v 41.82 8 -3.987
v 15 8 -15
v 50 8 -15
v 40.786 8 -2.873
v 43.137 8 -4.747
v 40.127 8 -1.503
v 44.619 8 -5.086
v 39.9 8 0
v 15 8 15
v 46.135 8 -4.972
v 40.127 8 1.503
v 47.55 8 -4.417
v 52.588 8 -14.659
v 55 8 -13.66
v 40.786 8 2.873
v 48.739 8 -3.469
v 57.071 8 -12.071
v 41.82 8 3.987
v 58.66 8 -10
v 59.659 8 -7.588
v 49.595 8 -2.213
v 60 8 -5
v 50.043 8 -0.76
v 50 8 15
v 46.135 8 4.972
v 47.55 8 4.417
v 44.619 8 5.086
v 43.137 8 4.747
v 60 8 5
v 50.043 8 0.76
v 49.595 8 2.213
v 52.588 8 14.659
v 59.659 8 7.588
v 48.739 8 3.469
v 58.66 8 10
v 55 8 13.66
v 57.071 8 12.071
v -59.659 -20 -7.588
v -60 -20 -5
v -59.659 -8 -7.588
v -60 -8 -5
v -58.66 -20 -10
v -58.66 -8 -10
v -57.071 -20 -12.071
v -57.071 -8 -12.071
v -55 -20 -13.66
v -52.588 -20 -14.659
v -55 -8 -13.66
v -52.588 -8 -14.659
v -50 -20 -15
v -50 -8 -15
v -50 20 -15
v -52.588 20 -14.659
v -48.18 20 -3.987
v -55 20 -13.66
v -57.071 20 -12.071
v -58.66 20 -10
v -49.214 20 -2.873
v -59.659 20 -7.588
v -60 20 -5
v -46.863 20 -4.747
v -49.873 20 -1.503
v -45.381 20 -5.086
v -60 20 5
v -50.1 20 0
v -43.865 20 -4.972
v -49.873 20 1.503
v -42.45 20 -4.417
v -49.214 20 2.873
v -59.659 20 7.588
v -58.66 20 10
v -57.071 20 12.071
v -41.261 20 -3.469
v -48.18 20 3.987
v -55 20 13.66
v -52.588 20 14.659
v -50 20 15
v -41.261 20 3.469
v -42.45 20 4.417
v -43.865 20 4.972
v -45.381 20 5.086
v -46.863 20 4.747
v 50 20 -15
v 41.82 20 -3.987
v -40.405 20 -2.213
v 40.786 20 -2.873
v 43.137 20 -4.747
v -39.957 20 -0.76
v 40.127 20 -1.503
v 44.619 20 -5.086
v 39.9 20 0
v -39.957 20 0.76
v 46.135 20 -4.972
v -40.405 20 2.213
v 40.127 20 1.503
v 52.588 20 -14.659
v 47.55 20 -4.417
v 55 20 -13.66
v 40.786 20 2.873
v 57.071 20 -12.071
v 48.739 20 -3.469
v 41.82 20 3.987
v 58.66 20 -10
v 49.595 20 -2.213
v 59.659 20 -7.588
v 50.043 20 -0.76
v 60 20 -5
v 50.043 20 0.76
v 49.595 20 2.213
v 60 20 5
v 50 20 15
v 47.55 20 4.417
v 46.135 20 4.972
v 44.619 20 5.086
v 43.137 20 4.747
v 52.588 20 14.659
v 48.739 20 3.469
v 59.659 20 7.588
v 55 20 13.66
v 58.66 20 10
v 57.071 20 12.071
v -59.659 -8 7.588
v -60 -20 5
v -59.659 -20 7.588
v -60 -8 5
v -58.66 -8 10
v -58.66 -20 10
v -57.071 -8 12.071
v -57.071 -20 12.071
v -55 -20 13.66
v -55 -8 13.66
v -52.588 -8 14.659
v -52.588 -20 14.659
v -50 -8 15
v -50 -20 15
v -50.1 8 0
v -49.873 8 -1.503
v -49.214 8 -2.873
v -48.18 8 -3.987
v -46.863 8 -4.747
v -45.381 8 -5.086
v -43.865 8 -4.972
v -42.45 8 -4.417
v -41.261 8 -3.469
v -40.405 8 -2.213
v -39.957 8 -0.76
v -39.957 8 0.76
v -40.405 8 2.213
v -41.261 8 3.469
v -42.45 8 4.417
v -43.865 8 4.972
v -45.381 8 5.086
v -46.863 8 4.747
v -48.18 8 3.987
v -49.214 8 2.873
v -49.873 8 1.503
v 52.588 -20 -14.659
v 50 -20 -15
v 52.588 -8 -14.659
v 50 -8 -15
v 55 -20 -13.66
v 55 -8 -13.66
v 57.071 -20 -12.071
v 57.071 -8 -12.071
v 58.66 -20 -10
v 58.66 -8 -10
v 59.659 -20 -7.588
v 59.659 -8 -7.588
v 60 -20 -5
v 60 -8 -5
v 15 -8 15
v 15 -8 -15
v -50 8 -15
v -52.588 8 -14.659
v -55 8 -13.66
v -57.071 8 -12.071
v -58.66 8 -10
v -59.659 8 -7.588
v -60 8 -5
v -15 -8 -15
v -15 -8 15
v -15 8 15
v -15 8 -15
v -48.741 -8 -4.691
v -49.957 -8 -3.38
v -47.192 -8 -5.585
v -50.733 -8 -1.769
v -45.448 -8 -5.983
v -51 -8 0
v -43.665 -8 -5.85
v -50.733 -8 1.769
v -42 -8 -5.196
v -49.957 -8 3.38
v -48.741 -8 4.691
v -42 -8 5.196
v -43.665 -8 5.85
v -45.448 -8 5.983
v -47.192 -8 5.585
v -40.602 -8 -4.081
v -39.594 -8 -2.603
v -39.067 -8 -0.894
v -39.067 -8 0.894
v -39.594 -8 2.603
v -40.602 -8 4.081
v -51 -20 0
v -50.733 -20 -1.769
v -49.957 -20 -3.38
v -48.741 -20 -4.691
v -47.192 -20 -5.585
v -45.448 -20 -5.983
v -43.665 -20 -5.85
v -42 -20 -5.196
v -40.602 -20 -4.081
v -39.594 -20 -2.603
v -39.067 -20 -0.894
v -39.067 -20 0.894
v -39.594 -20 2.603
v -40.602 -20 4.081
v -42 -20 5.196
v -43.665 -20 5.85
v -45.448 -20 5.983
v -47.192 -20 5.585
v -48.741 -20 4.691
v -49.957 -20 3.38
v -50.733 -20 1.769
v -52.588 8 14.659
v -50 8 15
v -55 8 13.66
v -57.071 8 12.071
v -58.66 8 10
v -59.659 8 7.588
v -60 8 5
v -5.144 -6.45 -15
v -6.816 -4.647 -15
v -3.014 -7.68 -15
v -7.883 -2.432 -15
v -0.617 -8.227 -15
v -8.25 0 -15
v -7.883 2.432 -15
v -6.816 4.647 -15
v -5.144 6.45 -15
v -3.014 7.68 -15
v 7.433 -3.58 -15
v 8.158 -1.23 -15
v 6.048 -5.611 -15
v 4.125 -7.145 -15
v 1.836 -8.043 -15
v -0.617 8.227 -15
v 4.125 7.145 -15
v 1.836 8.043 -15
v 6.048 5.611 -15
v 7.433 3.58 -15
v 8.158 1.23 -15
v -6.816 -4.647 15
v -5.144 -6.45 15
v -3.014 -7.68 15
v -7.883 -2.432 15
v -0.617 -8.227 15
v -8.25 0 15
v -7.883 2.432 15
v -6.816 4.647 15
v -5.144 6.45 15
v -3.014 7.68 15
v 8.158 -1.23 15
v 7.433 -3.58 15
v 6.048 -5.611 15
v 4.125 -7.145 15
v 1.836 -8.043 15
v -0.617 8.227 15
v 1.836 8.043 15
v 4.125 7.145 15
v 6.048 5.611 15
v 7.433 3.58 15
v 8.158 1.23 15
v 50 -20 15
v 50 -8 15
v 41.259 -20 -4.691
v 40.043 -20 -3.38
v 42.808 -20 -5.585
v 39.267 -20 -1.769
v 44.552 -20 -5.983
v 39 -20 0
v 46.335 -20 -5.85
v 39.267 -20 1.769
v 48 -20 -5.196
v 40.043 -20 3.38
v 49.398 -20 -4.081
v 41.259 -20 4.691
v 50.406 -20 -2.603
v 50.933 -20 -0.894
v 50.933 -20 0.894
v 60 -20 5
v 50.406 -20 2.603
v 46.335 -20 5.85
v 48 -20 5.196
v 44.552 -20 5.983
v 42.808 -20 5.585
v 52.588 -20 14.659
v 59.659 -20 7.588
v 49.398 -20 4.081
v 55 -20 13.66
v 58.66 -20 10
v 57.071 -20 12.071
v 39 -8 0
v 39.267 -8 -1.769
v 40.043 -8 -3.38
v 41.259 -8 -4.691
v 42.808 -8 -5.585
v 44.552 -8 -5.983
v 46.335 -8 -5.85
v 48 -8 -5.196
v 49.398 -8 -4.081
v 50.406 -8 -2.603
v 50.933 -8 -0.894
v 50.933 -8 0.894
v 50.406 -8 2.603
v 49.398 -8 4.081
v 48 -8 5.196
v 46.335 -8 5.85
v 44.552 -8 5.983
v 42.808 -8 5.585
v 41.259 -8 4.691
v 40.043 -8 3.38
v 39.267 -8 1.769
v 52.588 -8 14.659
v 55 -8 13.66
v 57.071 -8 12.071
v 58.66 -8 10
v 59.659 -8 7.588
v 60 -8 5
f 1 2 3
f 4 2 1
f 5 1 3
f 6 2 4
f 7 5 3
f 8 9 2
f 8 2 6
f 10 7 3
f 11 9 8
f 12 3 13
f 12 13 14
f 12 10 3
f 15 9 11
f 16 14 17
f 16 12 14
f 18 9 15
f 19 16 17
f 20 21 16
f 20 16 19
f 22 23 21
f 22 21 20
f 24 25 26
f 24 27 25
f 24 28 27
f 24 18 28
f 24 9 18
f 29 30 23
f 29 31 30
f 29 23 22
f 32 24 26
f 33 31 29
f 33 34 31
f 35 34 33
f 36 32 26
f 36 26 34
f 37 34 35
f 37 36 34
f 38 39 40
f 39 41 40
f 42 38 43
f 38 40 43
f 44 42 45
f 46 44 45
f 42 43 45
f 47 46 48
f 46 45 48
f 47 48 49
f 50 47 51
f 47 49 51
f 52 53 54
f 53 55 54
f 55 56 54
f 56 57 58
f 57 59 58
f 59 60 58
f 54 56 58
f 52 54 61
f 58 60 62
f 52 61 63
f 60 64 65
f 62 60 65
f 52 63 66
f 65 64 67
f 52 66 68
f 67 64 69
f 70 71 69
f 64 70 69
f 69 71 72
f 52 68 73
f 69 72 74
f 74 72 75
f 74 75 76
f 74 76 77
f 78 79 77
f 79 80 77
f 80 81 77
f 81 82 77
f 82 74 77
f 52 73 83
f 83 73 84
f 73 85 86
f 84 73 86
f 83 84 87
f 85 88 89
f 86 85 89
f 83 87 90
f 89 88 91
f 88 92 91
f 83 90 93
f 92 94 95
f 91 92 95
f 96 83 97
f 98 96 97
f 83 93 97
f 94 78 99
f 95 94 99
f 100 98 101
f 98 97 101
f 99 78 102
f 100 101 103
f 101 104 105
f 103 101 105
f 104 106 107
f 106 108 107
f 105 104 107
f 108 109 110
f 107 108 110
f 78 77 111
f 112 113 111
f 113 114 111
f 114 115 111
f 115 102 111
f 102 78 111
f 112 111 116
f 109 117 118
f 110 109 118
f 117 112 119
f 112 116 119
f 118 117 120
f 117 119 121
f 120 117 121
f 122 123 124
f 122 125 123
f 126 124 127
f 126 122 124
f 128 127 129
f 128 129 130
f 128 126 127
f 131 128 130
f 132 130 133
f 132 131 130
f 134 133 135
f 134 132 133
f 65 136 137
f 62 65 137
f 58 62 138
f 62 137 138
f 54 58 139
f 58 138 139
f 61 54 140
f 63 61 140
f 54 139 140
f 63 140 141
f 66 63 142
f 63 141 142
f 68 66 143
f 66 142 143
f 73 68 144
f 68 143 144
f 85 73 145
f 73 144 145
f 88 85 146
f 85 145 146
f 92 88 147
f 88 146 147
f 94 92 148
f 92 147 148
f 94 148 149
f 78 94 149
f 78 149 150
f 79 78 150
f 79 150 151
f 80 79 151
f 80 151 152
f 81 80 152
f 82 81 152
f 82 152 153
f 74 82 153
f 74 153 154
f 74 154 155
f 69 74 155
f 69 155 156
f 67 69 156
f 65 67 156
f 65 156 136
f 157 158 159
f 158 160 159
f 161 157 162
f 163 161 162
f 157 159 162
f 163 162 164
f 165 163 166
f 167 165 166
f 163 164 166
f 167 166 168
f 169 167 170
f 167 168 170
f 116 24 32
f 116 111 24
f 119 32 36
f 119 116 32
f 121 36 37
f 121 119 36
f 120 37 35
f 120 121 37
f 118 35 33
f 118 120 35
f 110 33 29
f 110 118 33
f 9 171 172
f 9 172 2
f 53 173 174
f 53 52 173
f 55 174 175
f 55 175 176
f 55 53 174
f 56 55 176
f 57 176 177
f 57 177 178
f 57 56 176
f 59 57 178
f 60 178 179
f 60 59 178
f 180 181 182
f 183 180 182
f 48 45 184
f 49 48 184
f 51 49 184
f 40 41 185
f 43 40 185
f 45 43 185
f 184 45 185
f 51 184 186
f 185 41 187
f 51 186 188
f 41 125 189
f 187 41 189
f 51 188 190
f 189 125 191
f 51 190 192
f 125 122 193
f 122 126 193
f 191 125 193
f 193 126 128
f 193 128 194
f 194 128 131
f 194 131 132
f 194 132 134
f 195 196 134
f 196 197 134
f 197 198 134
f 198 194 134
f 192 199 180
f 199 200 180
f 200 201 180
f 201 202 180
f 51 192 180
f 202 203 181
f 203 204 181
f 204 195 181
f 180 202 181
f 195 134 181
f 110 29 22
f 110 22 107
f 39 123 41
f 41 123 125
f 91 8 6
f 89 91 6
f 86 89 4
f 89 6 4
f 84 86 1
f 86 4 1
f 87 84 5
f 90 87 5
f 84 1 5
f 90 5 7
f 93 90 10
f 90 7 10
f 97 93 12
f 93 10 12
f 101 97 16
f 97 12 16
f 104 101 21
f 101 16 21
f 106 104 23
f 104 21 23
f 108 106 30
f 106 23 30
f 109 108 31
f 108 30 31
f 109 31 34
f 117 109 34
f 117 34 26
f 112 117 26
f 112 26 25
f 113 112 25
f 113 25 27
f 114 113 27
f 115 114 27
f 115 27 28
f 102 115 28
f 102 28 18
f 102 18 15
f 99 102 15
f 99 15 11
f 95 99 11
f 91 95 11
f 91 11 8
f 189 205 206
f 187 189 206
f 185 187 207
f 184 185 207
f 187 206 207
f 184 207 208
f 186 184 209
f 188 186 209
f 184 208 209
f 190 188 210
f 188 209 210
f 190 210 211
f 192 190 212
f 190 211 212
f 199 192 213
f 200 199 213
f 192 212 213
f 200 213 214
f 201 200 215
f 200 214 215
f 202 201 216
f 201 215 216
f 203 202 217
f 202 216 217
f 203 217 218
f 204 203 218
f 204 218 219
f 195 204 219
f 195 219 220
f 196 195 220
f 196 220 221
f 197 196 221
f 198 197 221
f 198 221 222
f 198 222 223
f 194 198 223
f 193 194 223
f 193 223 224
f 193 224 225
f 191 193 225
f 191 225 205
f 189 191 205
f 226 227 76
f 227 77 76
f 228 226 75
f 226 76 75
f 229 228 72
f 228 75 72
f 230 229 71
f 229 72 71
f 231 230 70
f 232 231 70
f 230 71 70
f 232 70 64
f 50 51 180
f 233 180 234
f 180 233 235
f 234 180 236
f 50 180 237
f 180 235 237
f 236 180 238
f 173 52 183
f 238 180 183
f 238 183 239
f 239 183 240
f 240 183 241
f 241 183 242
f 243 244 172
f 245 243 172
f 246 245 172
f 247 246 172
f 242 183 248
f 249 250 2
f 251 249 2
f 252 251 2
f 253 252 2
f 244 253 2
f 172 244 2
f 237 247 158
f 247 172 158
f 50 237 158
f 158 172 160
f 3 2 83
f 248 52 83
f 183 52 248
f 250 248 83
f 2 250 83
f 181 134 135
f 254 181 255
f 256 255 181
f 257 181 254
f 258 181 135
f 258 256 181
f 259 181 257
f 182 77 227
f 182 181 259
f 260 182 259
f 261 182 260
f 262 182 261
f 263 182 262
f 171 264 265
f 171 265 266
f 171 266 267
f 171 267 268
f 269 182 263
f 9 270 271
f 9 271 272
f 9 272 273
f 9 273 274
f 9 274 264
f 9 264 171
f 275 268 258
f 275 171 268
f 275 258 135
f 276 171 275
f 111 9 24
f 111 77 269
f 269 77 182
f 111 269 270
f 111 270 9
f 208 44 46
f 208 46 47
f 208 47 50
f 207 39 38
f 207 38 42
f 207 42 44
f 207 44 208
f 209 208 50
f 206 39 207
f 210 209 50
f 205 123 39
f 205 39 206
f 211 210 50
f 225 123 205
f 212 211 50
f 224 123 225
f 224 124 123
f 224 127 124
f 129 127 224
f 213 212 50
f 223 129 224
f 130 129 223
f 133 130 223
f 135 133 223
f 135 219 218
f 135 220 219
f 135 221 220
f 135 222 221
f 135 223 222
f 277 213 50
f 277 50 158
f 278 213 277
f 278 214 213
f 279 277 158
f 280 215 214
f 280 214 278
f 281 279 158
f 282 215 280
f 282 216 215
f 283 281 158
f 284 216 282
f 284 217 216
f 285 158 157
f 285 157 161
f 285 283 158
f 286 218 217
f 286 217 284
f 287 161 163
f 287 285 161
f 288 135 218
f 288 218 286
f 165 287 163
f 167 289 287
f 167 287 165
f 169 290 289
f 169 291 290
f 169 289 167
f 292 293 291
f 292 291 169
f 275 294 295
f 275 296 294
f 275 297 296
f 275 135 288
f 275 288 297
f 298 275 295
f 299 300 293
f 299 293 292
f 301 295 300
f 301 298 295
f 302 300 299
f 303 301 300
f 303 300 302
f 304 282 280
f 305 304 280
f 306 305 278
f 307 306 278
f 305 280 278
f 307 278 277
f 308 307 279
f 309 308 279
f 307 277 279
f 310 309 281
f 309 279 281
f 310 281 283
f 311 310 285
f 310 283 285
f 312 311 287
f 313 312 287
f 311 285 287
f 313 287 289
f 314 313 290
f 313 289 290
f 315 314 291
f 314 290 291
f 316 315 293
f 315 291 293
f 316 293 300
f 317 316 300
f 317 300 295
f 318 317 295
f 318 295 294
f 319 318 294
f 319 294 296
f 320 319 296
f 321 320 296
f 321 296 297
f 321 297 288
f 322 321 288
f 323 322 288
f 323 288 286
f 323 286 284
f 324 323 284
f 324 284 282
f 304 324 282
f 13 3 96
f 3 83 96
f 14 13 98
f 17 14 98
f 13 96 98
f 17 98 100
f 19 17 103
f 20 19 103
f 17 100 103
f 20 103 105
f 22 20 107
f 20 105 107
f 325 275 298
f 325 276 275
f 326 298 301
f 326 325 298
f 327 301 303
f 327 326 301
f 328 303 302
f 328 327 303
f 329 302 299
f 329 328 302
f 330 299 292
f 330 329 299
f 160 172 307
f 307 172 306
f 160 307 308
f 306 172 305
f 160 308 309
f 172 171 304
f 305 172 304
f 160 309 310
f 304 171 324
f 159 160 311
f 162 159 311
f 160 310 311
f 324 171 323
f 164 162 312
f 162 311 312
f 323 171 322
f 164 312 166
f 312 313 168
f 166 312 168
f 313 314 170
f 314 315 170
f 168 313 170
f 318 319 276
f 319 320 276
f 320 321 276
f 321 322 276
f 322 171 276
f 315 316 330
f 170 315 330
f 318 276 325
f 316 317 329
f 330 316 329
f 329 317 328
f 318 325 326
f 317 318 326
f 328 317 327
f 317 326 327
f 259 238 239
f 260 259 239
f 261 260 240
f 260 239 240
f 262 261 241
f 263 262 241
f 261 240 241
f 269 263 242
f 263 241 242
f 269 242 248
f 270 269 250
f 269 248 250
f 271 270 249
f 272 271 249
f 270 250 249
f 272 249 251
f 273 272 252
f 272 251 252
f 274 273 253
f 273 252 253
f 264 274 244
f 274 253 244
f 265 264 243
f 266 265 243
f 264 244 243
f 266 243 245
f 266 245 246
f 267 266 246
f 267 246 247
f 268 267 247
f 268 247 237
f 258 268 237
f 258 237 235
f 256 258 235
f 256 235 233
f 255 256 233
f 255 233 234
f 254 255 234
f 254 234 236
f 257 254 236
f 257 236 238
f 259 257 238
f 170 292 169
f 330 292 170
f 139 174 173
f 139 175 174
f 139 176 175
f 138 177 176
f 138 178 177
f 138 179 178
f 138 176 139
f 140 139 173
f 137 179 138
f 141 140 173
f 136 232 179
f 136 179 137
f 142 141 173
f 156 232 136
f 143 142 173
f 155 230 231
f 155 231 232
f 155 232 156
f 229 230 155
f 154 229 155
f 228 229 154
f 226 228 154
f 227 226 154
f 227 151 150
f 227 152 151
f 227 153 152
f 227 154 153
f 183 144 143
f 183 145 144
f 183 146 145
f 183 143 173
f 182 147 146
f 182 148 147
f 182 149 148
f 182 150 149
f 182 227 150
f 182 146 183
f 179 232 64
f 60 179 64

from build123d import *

# Parameters (mm, degrees)
SKETCH_1_W              = 120
SKETCH_1_H              = 40
EXTRUDE_1_DEPTH         = 15
SKETCH_5_R              = 6
CUT_EXTRUDE_2_DEPTH     = 20
M18X1_5_1_D             = 16.5
SKETCH_8_W              = 45
SKETCH_8_H              = 16
CUT_EXTRUDE_3_DEPTH     = 31
FILLET_1_R              = 10
HOLE_WIZARD_M12_1_D     = 10.2
HOLE_WIZARD_M12_1_DEPTH = 15
HOLE_WIZARD_M12_1_TIP   = 3.064389157


with BuildPart() as part:
    # 草图1 → 凸台-拉伸1 (new body, symmetric)
    with BuildSketch(Plane.XY):
        Rectangle(SKETCH_1_W, SKETCH_1_H)
    extrude(amount=EXTRUDE_1_DEPTH, both=True)

    # 草图5 → 切除-拉伸2 (cut)
    with BuildSketch(Plane(origin=(0, -20, 0), x_dir=(-1, 0, 0), z_dir=(0, -1, 0))):
        with Locations((45, 0)):
            Circle(SKETCH_5_R)
        with Locations((-45, 0)):
            Circle(SKETCH_5_R)
    extrude(amount=-CUT_EXTRUDE_2_DEPTH, mode=Mode.SUBTRACT)

    # M18x1.5 螺纹孔1 (through all)
    with Locations(Plane.XY.offset(15)):
        with Locations((0, 0)):
            Hole(M18X1_5_1_D / 2)

    # 草图8 → 切除-拉伸3 (cut, through all)
    with BuildSketch(Plane.XY.offset(15)):
        with Locations((-37.5, 0)):
            Rectangle(SKETCH_8_W, SKETCH_8_H)
        with Locations((37.5, 0)):
            Rectangle(SKETCH_8_W, SKETCH_8_H)
    extrude(amount=-CUT_EXTRUDE_3_DEPTH, mode=Mode.SUBTRACT)

    # 圆角1
    fillet_1_edges = [part.edges().sort_by_distance(p)[0] for p in [
        (-60, 14, 15),
        (-60, -14, -15),
        (-60, -14, 15),
        (60, -14, 15),
        (60, 14, -15),
        (60, 14, 15),
        (-60, 14, -15),
        (60, -14, -15),
    ]]
    fillet(fillet_1_edges, radius=FILLET_1_R)

    # M12 螺纹孔1
    with Locations(Plane(origin=(0, 20, 0), x_dir=(1, 0, 0), z_dir=(0, 1, 0))):
        with Locations((-45, 0), (45, 0)):
            Hole(HOLE_WIZARD_M12_1_D / 2, depth=HOLE_WIZARD_M12_1_DEPTH)
            with Locations((0, 0, -(HOLE_WIZARD_M12_1_DEPTH + HOLE_WIZARD_M12_1_TIP / 2))):  # 118° drill point
                Cone(0, HOLE_WIZARD_M12_1_D / 2, HOLE_WIZARD_M12_1_TIP, mode=Mode.SUBTRACT)


solid = part.part
